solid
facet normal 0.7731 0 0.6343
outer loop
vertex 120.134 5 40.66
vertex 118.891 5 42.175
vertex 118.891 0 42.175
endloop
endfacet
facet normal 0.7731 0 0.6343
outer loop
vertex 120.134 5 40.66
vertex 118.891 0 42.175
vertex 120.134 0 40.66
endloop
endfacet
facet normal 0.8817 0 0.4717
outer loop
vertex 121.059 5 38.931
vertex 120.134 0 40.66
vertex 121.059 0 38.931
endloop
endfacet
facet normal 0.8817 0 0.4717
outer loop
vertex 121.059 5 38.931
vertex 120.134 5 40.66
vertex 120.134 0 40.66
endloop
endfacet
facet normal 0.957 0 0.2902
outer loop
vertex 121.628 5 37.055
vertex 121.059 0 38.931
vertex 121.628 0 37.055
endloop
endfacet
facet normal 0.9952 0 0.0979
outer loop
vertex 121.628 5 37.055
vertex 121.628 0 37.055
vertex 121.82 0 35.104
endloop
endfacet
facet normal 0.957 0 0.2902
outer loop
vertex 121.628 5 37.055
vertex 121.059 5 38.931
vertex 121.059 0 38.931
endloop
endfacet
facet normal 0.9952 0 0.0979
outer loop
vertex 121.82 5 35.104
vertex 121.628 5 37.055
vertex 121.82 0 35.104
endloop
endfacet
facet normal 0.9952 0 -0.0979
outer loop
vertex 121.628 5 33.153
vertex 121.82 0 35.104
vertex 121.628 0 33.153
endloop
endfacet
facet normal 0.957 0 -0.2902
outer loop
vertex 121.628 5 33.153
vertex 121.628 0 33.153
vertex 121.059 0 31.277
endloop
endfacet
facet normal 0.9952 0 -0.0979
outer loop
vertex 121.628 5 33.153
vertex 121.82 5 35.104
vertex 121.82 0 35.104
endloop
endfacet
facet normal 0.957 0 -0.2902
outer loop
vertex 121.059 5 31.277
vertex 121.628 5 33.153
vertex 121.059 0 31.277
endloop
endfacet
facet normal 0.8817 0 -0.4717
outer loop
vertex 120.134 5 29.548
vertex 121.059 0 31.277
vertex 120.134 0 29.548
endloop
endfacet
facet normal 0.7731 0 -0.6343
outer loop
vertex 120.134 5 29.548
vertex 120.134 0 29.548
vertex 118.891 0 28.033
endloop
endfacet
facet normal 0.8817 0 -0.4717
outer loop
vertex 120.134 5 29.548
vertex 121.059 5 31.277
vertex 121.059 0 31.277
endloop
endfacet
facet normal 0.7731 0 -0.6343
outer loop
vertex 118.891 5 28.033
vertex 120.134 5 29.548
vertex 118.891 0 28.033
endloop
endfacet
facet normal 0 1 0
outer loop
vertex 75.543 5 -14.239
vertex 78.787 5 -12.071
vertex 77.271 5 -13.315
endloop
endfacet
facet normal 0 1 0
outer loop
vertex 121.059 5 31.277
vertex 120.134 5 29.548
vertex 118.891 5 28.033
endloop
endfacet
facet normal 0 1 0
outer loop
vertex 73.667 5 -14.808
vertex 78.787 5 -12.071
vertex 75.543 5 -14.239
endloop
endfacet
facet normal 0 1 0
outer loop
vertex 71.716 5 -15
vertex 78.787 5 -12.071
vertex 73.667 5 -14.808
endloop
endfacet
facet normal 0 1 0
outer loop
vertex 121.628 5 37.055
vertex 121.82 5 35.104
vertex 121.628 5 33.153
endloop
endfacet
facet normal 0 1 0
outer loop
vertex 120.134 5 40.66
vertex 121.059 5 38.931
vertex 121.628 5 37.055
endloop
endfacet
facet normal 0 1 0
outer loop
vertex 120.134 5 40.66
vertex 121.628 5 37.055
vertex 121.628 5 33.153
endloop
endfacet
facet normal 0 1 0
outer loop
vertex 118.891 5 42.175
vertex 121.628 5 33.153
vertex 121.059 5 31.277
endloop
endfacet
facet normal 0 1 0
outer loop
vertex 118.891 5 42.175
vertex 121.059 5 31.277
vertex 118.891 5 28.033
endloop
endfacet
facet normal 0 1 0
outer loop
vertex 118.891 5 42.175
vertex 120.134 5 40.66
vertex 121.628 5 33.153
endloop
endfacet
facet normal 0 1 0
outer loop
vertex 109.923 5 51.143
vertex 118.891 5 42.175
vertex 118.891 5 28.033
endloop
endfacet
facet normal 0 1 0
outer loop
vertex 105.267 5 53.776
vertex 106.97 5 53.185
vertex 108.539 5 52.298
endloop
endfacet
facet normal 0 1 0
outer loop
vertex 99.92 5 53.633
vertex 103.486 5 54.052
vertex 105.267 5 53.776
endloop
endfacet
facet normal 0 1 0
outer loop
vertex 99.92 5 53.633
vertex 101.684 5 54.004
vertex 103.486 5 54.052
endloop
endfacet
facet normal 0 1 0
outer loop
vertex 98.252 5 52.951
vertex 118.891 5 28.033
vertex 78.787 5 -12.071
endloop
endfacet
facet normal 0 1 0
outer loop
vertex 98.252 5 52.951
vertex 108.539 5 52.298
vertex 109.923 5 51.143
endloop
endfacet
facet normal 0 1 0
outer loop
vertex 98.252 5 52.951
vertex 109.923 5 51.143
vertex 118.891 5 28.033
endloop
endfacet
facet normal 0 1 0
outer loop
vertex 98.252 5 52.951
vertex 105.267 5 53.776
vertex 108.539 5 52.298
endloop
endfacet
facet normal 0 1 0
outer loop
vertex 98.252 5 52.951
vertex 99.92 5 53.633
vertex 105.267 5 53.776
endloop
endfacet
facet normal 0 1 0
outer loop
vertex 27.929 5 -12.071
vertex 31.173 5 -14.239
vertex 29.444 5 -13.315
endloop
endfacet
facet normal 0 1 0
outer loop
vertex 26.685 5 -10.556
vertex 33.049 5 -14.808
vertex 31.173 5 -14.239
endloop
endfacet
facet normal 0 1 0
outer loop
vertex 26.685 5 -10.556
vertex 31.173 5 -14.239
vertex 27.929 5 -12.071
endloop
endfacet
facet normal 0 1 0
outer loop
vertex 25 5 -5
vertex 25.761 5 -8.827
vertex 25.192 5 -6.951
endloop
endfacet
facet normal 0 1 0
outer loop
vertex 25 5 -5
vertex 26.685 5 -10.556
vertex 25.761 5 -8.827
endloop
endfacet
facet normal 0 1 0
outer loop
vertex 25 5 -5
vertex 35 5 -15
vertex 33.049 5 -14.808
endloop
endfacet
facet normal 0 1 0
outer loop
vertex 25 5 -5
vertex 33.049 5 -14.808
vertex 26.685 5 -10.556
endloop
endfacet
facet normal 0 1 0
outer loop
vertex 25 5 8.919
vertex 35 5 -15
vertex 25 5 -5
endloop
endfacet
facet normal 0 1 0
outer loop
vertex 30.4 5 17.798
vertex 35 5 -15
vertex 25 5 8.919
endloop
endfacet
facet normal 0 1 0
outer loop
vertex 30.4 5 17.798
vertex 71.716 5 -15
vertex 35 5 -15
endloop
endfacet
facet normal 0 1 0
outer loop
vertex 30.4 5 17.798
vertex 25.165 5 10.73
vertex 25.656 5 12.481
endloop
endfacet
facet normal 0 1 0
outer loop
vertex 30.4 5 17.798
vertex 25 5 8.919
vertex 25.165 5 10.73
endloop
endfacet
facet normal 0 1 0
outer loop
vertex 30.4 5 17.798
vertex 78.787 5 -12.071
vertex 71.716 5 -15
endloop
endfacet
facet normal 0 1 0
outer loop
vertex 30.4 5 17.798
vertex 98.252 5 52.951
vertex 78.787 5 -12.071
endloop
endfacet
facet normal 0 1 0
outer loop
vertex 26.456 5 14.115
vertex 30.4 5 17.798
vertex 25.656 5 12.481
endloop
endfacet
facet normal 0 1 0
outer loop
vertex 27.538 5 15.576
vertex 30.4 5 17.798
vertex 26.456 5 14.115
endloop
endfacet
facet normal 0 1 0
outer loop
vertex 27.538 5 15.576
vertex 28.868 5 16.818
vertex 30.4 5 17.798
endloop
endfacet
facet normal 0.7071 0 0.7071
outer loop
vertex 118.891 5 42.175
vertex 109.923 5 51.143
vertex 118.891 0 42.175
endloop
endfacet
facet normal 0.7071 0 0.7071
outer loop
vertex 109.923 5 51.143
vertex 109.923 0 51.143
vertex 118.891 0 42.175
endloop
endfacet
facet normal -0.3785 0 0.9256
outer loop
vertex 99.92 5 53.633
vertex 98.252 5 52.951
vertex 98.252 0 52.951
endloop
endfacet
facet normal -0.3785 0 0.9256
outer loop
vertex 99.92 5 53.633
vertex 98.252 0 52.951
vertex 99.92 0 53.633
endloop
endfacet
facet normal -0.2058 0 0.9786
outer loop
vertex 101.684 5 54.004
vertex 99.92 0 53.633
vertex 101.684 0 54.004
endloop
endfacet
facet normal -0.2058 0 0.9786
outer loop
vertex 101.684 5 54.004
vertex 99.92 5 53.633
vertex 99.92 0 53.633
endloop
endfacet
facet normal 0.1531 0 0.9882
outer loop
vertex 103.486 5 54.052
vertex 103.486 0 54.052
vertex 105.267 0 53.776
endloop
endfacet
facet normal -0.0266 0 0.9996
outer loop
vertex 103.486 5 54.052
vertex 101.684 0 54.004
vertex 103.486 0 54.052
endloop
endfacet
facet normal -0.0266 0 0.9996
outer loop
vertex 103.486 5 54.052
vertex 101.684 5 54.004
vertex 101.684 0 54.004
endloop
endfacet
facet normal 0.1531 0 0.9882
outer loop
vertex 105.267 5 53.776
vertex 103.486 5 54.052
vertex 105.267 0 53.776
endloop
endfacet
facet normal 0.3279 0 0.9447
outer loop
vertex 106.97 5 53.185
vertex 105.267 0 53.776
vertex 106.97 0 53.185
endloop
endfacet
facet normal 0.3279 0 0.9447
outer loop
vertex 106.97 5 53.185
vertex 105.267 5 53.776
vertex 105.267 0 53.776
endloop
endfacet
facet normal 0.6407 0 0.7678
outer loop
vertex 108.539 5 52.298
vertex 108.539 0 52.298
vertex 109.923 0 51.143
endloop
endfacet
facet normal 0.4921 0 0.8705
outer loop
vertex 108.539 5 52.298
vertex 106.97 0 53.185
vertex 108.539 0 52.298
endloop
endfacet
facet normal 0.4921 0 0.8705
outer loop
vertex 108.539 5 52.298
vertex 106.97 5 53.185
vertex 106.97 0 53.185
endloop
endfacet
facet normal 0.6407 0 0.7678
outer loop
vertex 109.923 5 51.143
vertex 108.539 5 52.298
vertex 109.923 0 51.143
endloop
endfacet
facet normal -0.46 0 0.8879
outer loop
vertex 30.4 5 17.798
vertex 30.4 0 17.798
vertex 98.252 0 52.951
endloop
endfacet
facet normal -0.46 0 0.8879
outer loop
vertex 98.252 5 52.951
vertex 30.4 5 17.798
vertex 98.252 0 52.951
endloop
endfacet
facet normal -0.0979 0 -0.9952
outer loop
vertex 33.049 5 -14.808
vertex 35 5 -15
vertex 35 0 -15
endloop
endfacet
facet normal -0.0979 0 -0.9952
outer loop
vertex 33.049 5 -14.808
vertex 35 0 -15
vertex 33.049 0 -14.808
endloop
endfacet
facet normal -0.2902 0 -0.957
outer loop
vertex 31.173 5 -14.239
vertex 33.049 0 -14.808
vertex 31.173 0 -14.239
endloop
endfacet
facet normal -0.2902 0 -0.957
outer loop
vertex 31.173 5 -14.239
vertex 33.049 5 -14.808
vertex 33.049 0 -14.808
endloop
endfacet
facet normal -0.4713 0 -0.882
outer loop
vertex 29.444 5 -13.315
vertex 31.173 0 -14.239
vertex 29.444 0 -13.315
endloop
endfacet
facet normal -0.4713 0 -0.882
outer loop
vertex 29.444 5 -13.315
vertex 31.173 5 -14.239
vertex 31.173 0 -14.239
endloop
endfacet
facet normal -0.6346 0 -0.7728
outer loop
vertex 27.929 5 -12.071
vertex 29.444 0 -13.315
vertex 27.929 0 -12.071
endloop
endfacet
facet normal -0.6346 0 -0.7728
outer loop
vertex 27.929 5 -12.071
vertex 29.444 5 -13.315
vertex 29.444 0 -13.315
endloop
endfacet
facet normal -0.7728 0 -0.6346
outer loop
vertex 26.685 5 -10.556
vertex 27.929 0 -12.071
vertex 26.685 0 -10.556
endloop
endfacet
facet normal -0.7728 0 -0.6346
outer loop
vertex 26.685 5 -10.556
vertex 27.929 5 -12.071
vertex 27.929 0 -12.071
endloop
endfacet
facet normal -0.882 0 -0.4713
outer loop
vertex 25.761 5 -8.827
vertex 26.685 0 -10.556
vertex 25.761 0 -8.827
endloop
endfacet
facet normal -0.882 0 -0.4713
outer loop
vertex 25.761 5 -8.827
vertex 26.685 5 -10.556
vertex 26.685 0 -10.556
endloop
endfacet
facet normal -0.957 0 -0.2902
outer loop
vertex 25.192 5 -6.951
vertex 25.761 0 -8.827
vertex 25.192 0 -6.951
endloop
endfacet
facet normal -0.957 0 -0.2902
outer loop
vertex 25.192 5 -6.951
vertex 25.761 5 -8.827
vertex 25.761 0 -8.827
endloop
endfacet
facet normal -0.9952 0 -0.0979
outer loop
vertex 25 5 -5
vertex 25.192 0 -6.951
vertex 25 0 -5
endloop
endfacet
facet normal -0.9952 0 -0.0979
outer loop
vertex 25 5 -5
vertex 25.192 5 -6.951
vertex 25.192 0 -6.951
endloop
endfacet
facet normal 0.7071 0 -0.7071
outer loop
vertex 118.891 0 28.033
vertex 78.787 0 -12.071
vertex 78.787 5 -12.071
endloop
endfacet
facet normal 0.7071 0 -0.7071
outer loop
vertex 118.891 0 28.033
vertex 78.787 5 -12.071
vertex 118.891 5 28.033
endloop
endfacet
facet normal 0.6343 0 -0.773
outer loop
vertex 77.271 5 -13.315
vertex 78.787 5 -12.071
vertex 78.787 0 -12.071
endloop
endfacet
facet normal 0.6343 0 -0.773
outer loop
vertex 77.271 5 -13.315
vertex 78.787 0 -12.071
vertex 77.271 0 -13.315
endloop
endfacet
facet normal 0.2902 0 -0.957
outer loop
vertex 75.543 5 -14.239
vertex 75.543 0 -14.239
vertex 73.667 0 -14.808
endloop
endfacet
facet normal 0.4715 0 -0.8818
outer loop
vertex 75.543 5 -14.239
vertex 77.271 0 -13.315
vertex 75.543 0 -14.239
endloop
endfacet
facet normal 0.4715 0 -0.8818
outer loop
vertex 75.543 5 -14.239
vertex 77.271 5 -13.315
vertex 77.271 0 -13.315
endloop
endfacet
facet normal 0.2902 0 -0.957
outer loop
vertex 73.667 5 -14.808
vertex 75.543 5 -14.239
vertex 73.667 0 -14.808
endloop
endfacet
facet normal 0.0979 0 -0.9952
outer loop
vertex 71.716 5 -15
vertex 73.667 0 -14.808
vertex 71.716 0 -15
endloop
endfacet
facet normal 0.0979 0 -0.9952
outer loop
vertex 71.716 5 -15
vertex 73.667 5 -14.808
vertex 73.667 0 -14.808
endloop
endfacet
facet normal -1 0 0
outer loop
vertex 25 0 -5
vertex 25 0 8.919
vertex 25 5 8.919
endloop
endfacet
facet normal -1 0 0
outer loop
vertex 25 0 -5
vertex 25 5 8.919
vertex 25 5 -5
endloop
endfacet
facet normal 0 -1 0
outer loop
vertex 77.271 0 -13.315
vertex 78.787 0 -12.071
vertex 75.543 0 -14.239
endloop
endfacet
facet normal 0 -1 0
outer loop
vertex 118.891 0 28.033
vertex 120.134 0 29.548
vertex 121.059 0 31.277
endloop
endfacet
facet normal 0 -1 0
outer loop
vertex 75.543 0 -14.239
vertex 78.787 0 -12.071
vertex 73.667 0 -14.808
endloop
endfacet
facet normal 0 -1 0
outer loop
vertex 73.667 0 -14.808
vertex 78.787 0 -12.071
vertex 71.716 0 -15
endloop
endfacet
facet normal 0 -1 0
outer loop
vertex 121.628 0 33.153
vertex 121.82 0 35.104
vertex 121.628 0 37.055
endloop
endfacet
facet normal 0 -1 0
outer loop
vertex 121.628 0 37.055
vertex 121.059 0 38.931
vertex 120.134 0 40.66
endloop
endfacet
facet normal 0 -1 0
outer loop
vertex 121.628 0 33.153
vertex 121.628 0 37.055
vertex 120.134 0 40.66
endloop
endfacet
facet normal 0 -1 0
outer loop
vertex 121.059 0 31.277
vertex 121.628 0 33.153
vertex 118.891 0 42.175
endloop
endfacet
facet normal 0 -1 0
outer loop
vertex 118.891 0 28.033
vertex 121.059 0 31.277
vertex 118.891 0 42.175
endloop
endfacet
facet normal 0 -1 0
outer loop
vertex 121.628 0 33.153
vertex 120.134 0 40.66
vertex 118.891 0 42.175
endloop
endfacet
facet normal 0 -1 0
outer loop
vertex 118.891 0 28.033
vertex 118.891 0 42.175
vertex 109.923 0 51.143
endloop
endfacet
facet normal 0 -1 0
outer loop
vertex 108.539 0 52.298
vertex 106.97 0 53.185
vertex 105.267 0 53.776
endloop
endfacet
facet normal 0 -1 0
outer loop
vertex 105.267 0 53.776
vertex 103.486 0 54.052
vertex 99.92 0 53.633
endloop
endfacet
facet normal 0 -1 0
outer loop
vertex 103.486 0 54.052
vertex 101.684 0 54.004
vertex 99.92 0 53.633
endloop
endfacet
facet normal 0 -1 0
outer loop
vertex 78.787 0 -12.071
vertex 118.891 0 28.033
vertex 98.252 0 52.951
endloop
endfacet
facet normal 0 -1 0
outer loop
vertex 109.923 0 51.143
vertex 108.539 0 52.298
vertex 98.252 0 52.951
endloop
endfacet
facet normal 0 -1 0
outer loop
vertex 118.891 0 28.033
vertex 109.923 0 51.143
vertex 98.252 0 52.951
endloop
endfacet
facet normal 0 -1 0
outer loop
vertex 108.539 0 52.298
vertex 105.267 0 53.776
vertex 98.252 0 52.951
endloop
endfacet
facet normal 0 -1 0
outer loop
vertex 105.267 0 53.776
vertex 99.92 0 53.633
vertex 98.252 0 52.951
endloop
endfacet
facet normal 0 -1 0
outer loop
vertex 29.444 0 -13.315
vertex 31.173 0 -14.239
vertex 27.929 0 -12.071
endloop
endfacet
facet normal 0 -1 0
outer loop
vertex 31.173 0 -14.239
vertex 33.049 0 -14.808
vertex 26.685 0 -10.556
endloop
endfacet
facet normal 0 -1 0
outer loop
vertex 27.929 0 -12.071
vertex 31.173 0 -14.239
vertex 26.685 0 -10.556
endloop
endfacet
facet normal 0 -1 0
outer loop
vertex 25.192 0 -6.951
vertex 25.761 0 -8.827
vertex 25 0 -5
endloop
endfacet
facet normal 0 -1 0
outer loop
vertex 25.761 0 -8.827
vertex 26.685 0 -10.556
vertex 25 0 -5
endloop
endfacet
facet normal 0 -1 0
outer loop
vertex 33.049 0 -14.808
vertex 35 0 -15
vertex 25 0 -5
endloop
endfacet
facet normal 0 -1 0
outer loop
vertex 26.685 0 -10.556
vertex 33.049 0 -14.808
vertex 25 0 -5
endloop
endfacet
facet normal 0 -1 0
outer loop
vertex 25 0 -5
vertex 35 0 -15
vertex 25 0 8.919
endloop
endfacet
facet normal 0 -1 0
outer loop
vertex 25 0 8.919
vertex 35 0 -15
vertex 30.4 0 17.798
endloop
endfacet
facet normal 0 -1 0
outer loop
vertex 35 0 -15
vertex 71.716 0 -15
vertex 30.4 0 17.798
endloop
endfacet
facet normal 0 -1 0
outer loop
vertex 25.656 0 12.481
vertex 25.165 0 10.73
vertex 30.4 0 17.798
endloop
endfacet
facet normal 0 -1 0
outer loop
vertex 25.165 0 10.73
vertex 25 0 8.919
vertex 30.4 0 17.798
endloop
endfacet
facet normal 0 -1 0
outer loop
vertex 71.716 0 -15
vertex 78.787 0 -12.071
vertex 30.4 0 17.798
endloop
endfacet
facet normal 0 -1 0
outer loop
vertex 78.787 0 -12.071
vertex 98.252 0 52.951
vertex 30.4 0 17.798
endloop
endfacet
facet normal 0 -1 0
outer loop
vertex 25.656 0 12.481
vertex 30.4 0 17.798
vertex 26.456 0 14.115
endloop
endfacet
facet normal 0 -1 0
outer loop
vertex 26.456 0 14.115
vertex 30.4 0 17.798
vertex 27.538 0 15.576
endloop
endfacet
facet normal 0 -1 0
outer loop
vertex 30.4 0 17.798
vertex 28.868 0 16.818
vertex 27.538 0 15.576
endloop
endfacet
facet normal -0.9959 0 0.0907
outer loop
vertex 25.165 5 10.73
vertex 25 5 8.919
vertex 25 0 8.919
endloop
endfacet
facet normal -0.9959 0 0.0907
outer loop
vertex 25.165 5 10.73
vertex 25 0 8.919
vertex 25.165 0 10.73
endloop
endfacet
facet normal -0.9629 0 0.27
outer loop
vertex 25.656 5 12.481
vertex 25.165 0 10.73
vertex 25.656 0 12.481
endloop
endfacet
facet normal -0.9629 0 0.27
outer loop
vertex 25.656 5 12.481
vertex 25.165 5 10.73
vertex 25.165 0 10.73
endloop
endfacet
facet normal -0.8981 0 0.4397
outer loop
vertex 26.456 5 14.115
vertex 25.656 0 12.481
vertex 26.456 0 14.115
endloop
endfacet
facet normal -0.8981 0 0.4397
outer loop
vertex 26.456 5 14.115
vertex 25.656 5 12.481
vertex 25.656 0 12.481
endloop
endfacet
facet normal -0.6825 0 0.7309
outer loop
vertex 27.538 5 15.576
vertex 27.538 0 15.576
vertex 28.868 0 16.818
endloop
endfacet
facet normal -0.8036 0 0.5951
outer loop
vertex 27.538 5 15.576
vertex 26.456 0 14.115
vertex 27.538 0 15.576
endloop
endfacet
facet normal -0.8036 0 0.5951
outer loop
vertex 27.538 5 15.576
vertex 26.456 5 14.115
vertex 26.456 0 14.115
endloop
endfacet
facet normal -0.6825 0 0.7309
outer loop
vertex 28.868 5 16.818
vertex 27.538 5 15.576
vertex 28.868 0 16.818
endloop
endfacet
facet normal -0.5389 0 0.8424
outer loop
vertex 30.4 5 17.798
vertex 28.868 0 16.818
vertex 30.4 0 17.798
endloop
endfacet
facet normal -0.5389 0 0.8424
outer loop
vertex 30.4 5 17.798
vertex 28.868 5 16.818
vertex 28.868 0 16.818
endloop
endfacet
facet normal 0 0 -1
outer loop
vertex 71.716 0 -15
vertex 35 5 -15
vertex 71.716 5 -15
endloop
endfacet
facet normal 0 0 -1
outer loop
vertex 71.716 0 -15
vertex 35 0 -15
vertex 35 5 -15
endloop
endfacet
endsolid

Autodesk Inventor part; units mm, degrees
ref_plane "YZ Plane" through (0, 0, 0) normal (1, 0, 0) x (0, 1, 0)
ref_plane "XZ Plane" through (0, 0, 0) normal (0, 1, 0) x (-1, 0, 0)
ref_plane "XY Plane" through (0, 0, 0) normal (0, 0, 1) x (1, 0, 0)
sketch "Sketch1" plane through (0, 0, 0) normal (0, 1, 0) x (-1, 0, 0)
  line L0 (0, 25) -> (0, -25)
  line L1 (0, 25) -> (-59.2893, 25) construction
  line L2 (-59.2893, 25) -> (-143.6396, 109.3503) construction
  line L3 (-143.6396, 109.3503) -> (-178.9949, 73.9949)
  line L4 (-178.9949, 73.9949) -> (-80, -25)
  line L5 (-80, -25) -> (0, -25)
  line L6 (-25, 25) -> (-25, -25)
  line L7 (-97.6777, 63.3883) -> (-133.033, 28.033)
  line L8 (-25, 15) -> (-104.7487, 56.3173)
  line L9 (-25, -15) -> (-75.8579, -15)
  line L10 (-75.8579, -15) -> (-125.9619, 35.1041)
  point P0 (0, 0)
  point P1 (0, 0)
  dimension "d0" = 50
  dimension "d1" = 80
  dimension "d2" = 135
  dimension "d3" = 140
  dimension "d4" = 50
  dimension "d37" = 25
  dimension "d38" = 65
  dimension "d39" = 10
  dimension "d40" = 10
  dimension "d41" = 10
  dimension "d42" = 10
extrude "Plate1" add sketch "Sketch1" along normal blind 5 contours L7 L8 L6 L9 L10
fillet "Corner Round1" radius 10 5 edges at (25, 2.5, -15) (25, 2.5, 15) (104.7487, 2.5, 56.3173) (125.9619, 2.5, 35.1041) (75.8579, 2.5, -15)
equation "\"d4\" = d0"
equation "\"d40\" = d39"
equation "\"d41\" = d39"
equation "\"d42\" = d41"
equation "\"d5\" = Thickness"
equation "\"BendRadius\" = Thickness"
equation "\"BendReliefWidth\" = Thickness"
equation "\"BendReliefDepth\" = 0.5 * Thickness"
equation "\"TransitionRadius\" = BendRadius"
equation "\"JacobiRadiusSize\" = BendRadius"
equation "\"GapSize\" = Thickness"
equation "\"Thickness\" = 5"
properties part number "PWTR-0089" material "Stainless Steel"
